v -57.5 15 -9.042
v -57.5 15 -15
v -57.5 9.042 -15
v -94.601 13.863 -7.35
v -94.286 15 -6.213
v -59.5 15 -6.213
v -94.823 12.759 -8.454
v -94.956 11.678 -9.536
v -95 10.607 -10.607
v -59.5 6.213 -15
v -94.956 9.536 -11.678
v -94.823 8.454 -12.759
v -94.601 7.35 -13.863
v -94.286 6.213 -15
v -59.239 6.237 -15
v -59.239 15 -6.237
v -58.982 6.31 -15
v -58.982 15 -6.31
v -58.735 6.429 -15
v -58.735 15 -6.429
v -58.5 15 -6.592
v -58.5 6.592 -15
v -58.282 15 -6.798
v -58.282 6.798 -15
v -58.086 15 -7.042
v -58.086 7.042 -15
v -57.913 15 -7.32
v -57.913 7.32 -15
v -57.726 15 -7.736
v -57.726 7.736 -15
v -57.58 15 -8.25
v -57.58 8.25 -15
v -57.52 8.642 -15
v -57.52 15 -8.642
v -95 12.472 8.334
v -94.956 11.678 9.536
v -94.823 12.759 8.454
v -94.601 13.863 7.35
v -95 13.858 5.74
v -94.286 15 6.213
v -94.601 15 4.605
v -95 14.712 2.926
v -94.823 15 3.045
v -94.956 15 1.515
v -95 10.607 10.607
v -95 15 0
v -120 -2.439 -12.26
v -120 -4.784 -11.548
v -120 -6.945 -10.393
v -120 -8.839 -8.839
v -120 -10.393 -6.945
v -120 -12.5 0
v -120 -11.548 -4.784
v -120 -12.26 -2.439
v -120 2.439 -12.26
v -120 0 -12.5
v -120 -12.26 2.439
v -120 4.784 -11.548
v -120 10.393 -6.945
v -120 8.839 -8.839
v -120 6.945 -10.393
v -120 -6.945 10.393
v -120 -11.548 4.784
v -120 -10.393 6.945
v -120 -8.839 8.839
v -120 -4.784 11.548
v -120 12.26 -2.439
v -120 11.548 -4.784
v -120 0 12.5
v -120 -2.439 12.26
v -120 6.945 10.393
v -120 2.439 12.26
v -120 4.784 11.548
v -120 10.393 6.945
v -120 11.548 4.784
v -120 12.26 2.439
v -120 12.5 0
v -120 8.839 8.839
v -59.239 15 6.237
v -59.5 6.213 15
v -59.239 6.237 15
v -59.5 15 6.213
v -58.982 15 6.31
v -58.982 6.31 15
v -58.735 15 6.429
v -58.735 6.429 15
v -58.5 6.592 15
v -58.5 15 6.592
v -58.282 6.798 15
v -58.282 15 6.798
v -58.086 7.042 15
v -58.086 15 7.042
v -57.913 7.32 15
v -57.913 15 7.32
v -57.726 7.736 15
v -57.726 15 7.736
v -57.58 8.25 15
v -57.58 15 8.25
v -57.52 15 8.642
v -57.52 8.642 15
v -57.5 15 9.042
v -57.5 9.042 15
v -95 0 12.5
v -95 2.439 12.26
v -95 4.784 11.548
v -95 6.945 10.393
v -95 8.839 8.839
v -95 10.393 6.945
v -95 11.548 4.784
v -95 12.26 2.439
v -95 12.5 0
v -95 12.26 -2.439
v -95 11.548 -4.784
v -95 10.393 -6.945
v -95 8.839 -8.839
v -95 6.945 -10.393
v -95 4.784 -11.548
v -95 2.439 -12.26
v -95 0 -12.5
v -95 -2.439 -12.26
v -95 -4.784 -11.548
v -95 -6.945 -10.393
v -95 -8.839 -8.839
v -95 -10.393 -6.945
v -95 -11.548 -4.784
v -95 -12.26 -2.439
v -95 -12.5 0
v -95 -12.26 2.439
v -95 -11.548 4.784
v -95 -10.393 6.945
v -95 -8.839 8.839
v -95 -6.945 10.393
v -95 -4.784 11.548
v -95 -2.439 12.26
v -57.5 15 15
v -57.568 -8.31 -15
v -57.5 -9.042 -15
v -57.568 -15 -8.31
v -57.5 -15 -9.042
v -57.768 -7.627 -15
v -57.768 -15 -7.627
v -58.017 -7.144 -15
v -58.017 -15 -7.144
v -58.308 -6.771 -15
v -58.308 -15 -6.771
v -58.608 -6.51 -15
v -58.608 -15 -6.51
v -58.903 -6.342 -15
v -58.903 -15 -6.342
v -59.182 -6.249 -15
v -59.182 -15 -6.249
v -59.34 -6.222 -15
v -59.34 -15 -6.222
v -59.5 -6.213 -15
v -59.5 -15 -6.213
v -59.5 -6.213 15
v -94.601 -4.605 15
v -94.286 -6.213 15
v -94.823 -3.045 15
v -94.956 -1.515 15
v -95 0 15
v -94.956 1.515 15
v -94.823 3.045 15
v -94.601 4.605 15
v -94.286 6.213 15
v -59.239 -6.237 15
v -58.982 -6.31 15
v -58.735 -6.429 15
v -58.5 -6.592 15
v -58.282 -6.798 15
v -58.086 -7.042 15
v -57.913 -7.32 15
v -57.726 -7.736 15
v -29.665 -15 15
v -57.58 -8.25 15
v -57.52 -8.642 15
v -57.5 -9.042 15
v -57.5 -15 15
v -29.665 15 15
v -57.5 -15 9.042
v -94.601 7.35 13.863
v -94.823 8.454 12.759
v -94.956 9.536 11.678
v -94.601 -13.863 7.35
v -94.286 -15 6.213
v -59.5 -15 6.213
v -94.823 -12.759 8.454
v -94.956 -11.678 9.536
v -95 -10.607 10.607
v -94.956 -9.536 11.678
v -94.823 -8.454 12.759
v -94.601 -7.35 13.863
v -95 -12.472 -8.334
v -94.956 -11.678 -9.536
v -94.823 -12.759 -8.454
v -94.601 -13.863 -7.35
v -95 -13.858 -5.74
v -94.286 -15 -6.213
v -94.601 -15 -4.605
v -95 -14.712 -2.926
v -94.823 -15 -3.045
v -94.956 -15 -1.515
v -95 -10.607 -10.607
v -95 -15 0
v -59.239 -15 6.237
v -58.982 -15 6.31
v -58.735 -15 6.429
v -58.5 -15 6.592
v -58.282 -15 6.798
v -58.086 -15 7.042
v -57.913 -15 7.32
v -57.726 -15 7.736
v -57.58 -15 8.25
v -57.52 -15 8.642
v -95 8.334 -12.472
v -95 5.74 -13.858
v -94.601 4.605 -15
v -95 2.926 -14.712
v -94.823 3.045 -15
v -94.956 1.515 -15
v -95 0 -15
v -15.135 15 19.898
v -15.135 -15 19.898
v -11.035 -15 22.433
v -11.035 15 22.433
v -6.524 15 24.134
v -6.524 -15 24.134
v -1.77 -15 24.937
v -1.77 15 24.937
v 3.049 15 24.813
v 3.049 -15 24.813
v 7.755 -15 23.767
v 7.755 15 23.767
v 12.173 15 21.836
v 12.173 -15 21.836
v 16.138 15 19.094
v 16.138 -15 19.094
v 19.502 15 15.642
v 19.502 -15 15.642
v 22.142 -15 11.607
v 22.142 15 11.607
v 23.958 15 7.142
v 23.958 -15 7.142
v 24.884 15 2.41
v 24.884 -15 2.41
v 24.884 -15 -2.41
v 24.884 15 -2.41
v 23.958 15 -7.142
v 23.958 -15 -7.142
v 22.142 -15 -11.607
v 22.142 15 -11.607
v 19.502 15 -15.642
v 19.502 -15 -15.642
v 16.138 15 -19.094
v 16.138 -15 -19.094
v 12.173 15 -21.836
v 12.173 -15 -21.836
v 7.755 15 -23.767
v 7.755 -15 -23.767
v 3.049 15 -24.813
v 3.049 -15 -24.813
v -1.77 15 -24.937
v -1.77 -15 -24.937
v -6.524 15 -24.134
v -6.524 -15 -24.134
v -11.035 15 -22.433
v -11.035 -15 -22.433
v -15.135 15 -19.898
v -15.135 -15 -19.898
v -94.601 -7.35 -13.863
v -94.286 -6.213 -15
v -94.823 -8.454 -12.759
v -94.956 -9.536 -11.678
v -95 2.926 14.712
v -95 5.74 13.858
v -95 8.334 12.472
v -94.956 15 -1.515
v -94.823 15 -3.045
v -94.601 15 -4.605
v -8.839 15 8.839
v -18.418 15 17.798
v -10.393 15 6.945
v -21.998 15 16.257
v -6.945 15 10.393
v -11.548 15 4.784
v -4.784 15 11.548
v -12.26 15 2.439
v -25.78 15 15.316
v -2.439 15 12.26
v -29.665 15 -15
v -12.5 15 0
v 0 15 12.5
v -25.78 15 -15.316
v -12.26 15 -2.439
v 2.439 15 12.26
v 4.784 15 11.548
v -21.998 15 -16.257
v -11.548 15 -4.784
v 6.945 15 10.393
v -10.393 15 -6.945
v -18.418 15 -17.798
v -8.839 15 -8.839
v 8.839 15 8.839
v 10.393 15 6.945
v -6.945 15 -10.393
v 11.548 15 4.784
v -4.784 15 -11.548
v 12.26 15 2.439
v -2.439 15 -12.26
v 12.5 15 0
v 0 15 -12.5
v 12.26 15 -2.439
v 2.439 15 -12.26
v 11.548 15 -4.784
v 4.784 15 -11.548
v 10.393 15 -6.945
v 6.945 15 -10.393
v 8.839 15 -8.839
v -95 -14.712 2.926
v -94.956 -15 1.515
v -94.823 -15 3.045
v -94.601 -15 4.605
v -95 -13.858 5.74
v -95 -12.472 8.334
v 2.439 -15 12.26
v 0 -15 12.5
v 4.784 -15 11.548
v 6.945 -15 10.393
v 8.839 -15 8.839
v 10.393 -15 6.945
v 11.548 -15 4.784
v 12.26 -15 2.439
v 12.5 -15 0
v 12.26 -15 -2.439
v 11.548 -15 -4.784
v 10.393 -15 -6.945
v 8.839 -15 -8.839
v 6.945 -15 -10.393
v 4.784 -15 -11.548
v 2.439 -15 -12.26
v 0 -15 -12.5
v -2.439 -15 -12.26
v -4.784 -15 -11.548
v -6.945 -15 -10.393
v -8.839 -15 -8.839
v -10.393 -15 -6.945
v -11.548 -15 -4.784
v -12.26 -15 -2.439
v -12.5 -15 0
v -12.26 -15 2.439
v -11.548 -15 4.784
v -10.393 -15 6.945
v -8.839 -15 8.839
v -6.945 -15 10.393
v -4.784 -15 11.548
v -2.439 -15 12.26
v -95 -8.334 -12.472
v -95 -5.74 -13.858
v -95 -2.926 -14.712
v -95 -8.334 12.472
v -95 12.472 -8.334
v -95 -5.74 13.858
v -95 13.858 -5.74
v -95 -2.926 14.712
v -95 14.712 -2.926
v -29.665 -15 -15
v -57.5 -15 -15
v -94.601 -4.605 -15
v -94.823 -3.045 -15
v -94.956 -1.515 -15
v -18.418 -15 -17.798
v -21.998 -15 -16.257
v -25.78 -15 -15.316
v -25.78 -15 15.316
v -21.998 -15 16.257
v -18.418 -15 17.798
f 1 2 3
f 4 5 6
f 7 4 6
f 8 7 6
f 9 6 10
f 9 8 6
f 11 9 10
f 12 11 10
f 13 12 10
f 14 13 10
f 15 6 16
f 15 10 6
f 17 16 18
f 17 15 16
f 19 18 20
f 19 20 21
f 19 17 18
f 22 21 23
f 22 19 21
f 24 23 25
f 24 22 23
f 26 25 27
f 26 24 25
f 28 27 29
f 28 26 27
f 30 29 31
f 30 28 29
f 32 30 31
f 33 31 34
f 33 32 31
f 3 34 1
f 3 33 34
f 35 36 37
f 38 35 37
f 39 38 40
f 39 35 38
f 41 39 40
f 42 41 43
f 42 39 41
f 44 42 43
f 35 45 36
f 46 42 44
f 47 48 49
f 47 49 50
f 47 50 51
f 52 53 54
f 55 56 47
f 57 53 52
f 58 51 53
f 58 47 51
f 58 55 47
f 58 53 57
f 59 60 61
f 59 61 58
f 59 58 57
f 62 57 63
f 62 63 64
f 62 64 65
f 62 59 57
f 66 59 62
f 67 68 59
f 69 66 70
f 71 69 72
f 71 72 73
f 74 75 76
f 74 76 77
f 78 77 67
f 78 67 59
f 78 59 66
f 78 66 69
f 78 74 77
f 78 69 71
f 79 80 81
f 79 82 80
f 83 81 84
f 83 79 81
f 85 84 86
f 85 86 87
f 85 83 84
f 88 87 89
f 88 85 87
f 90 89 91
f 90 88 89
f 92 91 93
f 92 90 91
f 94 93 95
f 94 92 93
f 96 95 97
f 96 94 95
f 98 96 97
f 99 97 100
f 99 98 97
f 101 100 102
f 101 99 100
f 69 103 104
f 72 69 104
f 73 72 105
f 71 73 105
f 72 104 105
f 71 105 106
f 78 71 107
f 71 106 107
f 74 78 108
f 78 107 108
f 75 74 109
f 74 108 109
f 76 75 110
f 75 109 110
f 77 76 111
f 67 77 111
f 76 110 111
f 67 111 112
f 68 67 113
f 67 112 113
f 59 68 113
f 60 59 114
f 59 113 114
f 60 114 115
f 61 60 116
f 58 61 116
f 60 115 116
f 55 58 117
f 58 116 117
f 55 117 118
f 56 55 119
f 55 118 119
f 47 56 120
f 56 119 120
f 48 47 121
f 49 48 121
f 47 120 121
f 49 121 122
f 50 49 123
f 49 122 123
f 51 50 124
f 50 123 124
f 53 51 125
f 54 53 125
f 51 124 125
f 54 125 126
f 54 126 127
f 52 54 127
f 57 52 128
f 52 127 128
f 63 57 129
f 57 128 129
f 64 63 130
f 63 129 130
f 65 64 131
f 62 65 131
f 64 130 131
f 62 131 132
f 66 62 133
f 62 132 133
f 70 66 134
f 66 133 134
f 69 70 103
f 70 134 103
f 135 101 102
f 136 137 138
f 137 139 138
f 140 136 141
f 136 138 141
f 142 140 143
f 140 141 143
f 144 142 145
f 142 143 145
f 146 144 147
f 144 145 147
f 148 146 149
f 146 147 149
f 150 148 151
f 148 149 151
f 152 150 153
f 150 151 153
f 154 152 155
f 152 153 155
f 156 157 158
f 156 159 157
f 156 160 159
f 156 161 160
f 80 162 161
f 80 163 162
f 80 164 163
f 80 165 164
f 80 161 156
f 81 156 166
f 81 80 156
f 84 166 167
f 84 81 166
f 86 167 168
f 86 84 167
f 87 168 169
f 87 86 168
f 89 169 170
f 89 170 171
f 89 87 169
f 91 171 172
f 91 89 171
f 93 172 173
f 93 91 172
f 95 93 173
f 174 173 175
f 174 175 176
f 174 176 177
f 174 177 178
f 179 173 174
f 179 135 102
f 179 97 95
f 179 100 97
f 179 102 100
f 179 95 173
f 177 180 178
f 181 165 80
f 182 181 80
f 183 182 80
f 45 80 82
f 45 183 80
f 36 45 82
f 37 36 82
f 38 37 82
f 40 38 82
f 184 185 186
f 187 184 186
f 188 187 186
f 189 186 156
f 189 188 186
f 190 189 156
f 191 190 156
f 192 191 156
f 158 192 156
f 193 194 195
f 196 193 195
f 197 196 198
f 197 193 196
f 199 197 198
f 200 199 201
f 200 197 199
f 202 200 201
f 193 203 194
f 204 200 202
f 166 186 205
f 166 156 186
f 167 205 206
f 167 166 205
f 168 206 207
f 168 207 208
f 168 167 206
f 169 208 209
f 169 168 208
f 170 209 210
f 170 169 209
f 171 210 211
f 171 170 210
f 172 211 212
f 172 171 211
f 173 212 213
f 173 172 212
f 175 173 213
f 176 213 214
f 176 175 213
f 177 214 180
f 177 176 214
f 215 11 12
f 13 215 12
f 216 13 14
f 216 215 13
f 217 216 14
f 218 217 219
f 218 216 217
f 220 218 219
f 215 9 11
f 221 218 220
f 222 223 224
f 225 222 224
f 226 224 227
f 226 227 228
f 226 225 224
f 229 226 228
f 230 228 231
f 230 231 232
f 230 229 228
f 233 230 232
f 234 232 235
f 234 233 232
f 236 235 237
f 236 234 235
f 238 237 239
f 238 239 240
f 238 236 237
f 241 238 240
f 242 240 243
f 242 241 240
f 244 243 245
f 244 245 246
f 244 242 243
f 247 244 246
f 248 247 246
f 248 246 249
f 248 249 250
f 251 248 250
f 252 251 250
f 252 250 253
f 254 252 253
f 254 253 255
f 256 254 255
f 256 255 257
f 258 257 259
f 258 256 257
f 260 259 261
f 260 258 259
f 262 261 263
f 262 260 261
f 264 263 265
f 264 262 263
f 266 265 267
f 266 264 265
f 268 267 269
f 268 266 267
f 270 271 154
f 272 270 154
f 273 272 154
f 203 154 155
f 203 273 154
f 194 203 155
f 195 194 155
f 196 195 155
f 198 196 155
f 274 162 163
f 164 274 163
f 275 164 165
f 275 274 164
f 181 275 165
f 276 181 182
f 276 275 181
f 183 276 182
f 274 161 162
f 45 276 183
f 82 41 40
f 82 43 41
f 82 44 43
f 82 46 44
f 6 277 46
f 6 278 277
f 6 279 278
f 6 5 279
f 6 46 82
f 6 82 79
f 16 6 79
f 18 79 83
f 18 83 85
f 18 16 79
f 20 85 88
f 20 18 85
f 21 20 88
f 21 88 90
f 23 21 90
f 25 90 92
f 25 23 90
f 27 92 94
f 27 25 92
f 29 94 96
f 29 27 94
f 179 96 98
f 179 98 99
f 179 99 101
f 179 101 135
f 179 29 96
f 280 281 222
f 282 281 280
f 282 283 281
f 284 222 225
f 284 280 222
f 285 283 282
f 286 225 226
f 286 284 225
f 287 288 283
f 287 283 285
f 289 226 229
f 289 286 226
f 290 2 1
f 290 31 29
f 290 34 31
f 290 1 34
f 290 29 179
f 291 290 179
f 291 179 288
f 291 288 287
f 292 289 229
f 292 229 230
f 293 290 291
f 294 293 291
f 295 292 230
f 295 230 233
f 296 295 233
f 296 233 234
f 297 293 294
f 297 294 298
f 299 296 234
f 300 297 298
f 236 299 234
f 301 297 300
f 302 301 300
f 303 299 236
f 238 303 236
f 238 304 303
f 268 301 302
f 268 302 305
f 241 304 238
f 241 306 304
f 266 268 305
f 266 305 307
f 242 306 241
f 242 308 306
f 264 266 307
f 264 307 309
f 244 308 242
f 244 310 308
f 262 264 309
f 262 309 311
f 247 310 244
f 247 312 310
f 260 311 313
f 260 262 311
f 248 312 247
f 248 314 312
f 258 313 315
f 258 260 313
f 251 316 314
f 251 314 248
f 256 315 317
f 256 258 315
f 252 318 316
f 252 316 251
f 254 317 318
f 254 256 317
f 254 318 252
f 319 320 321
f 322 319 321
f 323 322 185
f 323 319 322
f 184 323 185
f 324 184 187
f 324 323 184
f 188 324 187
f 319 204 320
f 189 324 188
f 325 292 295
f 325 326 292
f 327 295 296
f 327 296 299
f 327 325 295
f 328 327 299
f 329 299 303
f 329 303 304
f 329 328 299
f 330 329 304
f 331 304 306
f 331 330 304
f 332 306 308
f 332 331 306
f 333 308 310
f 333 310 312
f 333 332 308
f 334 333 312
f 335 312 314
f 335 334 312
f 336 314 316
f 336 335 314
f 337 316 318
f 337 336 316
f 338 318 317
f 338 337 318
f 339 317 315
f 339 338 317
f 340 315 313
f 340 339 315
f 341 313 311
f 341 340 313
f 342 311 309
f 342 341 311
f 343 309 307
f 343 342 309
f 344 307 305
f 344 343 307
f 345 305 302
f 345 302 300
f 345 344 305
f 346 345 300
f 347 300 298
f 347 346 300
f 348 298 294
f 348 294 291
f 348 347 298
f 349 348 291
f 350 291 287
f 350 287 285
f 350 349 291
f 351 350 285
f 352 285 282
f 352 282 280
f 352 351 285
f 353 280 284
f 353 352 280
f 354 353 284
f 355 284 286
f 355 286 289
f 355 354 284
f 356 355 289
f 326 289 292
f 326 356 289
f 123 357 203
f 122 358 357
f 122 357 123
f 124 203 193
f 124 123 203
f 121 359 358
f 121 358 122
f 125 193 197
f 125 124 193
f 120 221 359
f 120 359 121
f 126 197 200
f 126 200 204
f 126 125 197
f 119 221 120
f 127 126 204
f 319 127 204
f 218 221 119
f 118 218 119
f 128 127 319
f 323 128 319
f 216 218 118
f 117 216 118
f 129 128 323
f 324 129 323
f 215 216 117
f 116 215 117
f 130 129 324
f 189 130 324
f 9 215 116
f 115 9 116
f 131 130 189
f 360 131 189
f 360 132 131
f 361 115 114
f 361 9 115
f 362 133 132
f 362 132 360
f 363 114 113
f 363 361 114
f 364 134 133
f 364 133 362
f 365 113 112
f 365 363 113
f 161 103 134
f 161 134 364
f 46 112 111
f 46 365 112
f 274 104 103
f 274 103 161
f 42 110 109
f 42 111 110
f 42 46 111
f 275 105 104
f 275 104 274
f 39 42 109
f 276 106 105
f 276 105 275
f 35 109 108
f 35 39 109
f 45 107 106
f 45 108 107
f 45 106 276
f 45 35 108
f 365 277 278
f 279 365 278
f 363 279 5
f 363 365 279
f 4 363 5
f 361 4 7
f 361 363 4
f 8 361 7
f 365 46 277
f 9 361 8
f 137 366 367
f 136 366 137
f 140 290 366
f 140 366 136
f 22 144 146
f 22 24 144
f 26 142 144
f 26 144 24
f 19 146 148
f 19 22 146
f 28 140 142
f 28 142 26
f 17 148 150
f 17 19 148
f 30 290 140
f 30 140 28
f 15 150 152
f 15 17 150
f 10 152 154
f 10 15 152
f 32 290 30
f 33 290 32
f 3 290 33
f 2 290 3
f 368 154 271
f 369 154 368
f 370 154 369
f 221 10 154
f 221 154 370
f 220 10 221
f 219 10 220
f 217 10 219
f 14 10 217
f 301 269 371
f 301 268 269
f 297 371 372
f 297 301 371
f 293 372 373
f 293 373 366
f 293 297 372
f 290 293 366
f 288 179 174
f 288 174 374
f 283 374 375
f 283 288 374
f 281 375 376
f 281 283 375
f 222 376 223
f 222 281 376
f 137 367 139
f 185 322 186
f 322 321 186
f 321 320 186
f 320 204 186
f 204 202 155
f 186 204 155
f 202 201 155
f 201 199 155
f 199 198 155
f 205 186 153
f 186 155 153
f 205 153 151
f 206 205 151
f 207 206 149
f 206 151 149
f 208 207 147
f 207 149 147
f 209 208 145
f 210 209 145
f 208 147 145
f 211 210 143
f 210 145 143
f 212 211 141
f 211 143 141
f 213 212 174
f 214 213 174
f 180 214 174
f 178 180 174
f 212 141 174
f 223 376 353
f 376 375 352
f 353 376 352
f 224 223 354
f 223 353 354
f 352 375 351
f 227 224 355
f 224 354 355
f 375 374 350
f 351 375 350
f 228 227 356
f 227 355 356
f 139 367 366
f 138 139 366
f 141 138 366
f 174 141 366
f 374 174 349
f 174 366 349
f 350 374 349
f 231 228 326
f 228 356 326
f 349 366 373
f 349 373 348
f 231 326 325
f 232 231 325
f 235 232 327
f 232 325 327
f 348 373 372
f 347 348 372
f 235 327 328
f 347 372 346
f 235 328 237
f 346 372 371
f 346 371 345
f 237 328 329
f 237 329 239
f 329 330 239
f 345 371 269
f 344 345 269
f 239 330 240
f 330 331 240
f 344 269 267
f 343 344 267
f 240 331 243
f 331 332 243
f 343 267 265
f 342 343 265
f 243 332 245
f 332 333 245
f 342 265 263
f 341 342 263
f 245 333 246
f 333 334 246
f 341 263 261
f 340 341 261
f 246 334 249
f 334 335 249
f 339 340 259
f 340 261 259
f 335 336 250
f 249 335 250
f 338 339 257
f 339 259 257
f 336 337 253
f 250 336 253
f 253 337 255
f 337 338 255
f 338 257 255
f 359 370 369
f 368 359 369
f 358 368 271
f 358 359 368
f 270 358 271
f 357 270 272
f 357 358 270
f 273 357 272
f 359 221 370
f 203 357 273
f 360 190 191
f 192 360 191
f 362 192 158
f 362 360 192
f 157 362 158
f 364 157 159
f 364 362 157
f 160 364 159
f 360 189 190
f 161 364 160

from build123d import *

# Parameters (mm, degrees)
SKETCH1_R           = 12.5
BOSS_EXTRUDE1_DEPTH = 15
SKETCH2_OUTSIDE_W   = 78.684
SKETCH2_OUTSIDE_H   = 58.684
CUT_EXTRUDE1_DEPTH  = 37.5
SKETCH3_R           = 12.5
BOSS_EXTRUDE2_DEPTH = 25
FILLET1_R           = 2


with BuildPart() as part:
    # Sketch1 → Boss-Extrude1 (new, symmetric)
    with BuildSketch(Plane(origin=(0, 0, 0), x_dir=(1, 0, 0), z_dir=(0, 1, 0))):
        with BuildLine():
            Line((-29.664793948, 15), (-95, 15))
            Line((-95, 15), (-95, -15))
            Line((-95, -15), (-29.664793948, -15))
            ThreePointArc((-29.664793948, -15), (-21.998275168, -16.257430009), (-15.135098953, -19.897959184))
            ThreePointArc((-15.135098953, -19.897959184), (25, 0), (-15.135098953, 19.897959184))
            ThreePointArc((-15.135098953, 19.897959184), (-21.998275168, 16.257430009), (-29.664793948, 15))
        make_face()
        with Locations(Location((0, 0, 0), (0, 0, 270))):
            Circle(SKETCH1_R, mode=Mode.SUBTRACT)
    extrude(amount=BOSS_EXTRUDE1_DEPTH, both=True)

    # Sketch2 outside → Cut-Extrude1 (cut)
    with BuildSketch(Plane.ZY.offset(95)):
        Rectangle(SKETCH2_OUTSIDE_W, SKETCH2_OUTSIDE_H)
        Polygon((6.213203436, 15), (-6.213203436, 15), (-15, 6.213203436), (-15, -6.213203436), (-6.213203436, -15), (6.213203436, -15), (15, -6.213203436), (15, 6.213203436), align=None, mode=Mode.SUBTRACT)
    extrude(amount=-CUT_EXTRUDE1_DEPTH, mode=Mode.SUBTRACT)

    # Sketch3 → Boss-Extrude2 (add)
    with BuildSketch(Plane.ZY.offset(95)):
        Circle(SKETCH3_R)
    extrude(amount=BOSS_EXTRUDE2_DEPTH)

    # Fillet1
    fillet1_edges = [part.edges().sort_by_distance(p)[0] for p in [
        (-57.5, 10.606601718, -10.606601718),
        (-57.5, -10.606601718, -10.606601718),
        (-57.5, 10.606601718, 10.606601718),
        (-57.5, -10.606601718, 10.606601718),
    ]]
    fillet(fillet1_edges, radius=FILLET1_R)

    # Sketch4 → Cut-Revolve1 (revolve, cut)
    with BuildSketch(Plane.XY):
        Polygon((-95, 15), (-95, 27.0023011), (-88.070468229, 27.0023011), align=None)
    revolve(axis=Axis((0, 0, 0), (-1, 0, 0)), mode=Mode.SUBTRACT)


solid = part.part
